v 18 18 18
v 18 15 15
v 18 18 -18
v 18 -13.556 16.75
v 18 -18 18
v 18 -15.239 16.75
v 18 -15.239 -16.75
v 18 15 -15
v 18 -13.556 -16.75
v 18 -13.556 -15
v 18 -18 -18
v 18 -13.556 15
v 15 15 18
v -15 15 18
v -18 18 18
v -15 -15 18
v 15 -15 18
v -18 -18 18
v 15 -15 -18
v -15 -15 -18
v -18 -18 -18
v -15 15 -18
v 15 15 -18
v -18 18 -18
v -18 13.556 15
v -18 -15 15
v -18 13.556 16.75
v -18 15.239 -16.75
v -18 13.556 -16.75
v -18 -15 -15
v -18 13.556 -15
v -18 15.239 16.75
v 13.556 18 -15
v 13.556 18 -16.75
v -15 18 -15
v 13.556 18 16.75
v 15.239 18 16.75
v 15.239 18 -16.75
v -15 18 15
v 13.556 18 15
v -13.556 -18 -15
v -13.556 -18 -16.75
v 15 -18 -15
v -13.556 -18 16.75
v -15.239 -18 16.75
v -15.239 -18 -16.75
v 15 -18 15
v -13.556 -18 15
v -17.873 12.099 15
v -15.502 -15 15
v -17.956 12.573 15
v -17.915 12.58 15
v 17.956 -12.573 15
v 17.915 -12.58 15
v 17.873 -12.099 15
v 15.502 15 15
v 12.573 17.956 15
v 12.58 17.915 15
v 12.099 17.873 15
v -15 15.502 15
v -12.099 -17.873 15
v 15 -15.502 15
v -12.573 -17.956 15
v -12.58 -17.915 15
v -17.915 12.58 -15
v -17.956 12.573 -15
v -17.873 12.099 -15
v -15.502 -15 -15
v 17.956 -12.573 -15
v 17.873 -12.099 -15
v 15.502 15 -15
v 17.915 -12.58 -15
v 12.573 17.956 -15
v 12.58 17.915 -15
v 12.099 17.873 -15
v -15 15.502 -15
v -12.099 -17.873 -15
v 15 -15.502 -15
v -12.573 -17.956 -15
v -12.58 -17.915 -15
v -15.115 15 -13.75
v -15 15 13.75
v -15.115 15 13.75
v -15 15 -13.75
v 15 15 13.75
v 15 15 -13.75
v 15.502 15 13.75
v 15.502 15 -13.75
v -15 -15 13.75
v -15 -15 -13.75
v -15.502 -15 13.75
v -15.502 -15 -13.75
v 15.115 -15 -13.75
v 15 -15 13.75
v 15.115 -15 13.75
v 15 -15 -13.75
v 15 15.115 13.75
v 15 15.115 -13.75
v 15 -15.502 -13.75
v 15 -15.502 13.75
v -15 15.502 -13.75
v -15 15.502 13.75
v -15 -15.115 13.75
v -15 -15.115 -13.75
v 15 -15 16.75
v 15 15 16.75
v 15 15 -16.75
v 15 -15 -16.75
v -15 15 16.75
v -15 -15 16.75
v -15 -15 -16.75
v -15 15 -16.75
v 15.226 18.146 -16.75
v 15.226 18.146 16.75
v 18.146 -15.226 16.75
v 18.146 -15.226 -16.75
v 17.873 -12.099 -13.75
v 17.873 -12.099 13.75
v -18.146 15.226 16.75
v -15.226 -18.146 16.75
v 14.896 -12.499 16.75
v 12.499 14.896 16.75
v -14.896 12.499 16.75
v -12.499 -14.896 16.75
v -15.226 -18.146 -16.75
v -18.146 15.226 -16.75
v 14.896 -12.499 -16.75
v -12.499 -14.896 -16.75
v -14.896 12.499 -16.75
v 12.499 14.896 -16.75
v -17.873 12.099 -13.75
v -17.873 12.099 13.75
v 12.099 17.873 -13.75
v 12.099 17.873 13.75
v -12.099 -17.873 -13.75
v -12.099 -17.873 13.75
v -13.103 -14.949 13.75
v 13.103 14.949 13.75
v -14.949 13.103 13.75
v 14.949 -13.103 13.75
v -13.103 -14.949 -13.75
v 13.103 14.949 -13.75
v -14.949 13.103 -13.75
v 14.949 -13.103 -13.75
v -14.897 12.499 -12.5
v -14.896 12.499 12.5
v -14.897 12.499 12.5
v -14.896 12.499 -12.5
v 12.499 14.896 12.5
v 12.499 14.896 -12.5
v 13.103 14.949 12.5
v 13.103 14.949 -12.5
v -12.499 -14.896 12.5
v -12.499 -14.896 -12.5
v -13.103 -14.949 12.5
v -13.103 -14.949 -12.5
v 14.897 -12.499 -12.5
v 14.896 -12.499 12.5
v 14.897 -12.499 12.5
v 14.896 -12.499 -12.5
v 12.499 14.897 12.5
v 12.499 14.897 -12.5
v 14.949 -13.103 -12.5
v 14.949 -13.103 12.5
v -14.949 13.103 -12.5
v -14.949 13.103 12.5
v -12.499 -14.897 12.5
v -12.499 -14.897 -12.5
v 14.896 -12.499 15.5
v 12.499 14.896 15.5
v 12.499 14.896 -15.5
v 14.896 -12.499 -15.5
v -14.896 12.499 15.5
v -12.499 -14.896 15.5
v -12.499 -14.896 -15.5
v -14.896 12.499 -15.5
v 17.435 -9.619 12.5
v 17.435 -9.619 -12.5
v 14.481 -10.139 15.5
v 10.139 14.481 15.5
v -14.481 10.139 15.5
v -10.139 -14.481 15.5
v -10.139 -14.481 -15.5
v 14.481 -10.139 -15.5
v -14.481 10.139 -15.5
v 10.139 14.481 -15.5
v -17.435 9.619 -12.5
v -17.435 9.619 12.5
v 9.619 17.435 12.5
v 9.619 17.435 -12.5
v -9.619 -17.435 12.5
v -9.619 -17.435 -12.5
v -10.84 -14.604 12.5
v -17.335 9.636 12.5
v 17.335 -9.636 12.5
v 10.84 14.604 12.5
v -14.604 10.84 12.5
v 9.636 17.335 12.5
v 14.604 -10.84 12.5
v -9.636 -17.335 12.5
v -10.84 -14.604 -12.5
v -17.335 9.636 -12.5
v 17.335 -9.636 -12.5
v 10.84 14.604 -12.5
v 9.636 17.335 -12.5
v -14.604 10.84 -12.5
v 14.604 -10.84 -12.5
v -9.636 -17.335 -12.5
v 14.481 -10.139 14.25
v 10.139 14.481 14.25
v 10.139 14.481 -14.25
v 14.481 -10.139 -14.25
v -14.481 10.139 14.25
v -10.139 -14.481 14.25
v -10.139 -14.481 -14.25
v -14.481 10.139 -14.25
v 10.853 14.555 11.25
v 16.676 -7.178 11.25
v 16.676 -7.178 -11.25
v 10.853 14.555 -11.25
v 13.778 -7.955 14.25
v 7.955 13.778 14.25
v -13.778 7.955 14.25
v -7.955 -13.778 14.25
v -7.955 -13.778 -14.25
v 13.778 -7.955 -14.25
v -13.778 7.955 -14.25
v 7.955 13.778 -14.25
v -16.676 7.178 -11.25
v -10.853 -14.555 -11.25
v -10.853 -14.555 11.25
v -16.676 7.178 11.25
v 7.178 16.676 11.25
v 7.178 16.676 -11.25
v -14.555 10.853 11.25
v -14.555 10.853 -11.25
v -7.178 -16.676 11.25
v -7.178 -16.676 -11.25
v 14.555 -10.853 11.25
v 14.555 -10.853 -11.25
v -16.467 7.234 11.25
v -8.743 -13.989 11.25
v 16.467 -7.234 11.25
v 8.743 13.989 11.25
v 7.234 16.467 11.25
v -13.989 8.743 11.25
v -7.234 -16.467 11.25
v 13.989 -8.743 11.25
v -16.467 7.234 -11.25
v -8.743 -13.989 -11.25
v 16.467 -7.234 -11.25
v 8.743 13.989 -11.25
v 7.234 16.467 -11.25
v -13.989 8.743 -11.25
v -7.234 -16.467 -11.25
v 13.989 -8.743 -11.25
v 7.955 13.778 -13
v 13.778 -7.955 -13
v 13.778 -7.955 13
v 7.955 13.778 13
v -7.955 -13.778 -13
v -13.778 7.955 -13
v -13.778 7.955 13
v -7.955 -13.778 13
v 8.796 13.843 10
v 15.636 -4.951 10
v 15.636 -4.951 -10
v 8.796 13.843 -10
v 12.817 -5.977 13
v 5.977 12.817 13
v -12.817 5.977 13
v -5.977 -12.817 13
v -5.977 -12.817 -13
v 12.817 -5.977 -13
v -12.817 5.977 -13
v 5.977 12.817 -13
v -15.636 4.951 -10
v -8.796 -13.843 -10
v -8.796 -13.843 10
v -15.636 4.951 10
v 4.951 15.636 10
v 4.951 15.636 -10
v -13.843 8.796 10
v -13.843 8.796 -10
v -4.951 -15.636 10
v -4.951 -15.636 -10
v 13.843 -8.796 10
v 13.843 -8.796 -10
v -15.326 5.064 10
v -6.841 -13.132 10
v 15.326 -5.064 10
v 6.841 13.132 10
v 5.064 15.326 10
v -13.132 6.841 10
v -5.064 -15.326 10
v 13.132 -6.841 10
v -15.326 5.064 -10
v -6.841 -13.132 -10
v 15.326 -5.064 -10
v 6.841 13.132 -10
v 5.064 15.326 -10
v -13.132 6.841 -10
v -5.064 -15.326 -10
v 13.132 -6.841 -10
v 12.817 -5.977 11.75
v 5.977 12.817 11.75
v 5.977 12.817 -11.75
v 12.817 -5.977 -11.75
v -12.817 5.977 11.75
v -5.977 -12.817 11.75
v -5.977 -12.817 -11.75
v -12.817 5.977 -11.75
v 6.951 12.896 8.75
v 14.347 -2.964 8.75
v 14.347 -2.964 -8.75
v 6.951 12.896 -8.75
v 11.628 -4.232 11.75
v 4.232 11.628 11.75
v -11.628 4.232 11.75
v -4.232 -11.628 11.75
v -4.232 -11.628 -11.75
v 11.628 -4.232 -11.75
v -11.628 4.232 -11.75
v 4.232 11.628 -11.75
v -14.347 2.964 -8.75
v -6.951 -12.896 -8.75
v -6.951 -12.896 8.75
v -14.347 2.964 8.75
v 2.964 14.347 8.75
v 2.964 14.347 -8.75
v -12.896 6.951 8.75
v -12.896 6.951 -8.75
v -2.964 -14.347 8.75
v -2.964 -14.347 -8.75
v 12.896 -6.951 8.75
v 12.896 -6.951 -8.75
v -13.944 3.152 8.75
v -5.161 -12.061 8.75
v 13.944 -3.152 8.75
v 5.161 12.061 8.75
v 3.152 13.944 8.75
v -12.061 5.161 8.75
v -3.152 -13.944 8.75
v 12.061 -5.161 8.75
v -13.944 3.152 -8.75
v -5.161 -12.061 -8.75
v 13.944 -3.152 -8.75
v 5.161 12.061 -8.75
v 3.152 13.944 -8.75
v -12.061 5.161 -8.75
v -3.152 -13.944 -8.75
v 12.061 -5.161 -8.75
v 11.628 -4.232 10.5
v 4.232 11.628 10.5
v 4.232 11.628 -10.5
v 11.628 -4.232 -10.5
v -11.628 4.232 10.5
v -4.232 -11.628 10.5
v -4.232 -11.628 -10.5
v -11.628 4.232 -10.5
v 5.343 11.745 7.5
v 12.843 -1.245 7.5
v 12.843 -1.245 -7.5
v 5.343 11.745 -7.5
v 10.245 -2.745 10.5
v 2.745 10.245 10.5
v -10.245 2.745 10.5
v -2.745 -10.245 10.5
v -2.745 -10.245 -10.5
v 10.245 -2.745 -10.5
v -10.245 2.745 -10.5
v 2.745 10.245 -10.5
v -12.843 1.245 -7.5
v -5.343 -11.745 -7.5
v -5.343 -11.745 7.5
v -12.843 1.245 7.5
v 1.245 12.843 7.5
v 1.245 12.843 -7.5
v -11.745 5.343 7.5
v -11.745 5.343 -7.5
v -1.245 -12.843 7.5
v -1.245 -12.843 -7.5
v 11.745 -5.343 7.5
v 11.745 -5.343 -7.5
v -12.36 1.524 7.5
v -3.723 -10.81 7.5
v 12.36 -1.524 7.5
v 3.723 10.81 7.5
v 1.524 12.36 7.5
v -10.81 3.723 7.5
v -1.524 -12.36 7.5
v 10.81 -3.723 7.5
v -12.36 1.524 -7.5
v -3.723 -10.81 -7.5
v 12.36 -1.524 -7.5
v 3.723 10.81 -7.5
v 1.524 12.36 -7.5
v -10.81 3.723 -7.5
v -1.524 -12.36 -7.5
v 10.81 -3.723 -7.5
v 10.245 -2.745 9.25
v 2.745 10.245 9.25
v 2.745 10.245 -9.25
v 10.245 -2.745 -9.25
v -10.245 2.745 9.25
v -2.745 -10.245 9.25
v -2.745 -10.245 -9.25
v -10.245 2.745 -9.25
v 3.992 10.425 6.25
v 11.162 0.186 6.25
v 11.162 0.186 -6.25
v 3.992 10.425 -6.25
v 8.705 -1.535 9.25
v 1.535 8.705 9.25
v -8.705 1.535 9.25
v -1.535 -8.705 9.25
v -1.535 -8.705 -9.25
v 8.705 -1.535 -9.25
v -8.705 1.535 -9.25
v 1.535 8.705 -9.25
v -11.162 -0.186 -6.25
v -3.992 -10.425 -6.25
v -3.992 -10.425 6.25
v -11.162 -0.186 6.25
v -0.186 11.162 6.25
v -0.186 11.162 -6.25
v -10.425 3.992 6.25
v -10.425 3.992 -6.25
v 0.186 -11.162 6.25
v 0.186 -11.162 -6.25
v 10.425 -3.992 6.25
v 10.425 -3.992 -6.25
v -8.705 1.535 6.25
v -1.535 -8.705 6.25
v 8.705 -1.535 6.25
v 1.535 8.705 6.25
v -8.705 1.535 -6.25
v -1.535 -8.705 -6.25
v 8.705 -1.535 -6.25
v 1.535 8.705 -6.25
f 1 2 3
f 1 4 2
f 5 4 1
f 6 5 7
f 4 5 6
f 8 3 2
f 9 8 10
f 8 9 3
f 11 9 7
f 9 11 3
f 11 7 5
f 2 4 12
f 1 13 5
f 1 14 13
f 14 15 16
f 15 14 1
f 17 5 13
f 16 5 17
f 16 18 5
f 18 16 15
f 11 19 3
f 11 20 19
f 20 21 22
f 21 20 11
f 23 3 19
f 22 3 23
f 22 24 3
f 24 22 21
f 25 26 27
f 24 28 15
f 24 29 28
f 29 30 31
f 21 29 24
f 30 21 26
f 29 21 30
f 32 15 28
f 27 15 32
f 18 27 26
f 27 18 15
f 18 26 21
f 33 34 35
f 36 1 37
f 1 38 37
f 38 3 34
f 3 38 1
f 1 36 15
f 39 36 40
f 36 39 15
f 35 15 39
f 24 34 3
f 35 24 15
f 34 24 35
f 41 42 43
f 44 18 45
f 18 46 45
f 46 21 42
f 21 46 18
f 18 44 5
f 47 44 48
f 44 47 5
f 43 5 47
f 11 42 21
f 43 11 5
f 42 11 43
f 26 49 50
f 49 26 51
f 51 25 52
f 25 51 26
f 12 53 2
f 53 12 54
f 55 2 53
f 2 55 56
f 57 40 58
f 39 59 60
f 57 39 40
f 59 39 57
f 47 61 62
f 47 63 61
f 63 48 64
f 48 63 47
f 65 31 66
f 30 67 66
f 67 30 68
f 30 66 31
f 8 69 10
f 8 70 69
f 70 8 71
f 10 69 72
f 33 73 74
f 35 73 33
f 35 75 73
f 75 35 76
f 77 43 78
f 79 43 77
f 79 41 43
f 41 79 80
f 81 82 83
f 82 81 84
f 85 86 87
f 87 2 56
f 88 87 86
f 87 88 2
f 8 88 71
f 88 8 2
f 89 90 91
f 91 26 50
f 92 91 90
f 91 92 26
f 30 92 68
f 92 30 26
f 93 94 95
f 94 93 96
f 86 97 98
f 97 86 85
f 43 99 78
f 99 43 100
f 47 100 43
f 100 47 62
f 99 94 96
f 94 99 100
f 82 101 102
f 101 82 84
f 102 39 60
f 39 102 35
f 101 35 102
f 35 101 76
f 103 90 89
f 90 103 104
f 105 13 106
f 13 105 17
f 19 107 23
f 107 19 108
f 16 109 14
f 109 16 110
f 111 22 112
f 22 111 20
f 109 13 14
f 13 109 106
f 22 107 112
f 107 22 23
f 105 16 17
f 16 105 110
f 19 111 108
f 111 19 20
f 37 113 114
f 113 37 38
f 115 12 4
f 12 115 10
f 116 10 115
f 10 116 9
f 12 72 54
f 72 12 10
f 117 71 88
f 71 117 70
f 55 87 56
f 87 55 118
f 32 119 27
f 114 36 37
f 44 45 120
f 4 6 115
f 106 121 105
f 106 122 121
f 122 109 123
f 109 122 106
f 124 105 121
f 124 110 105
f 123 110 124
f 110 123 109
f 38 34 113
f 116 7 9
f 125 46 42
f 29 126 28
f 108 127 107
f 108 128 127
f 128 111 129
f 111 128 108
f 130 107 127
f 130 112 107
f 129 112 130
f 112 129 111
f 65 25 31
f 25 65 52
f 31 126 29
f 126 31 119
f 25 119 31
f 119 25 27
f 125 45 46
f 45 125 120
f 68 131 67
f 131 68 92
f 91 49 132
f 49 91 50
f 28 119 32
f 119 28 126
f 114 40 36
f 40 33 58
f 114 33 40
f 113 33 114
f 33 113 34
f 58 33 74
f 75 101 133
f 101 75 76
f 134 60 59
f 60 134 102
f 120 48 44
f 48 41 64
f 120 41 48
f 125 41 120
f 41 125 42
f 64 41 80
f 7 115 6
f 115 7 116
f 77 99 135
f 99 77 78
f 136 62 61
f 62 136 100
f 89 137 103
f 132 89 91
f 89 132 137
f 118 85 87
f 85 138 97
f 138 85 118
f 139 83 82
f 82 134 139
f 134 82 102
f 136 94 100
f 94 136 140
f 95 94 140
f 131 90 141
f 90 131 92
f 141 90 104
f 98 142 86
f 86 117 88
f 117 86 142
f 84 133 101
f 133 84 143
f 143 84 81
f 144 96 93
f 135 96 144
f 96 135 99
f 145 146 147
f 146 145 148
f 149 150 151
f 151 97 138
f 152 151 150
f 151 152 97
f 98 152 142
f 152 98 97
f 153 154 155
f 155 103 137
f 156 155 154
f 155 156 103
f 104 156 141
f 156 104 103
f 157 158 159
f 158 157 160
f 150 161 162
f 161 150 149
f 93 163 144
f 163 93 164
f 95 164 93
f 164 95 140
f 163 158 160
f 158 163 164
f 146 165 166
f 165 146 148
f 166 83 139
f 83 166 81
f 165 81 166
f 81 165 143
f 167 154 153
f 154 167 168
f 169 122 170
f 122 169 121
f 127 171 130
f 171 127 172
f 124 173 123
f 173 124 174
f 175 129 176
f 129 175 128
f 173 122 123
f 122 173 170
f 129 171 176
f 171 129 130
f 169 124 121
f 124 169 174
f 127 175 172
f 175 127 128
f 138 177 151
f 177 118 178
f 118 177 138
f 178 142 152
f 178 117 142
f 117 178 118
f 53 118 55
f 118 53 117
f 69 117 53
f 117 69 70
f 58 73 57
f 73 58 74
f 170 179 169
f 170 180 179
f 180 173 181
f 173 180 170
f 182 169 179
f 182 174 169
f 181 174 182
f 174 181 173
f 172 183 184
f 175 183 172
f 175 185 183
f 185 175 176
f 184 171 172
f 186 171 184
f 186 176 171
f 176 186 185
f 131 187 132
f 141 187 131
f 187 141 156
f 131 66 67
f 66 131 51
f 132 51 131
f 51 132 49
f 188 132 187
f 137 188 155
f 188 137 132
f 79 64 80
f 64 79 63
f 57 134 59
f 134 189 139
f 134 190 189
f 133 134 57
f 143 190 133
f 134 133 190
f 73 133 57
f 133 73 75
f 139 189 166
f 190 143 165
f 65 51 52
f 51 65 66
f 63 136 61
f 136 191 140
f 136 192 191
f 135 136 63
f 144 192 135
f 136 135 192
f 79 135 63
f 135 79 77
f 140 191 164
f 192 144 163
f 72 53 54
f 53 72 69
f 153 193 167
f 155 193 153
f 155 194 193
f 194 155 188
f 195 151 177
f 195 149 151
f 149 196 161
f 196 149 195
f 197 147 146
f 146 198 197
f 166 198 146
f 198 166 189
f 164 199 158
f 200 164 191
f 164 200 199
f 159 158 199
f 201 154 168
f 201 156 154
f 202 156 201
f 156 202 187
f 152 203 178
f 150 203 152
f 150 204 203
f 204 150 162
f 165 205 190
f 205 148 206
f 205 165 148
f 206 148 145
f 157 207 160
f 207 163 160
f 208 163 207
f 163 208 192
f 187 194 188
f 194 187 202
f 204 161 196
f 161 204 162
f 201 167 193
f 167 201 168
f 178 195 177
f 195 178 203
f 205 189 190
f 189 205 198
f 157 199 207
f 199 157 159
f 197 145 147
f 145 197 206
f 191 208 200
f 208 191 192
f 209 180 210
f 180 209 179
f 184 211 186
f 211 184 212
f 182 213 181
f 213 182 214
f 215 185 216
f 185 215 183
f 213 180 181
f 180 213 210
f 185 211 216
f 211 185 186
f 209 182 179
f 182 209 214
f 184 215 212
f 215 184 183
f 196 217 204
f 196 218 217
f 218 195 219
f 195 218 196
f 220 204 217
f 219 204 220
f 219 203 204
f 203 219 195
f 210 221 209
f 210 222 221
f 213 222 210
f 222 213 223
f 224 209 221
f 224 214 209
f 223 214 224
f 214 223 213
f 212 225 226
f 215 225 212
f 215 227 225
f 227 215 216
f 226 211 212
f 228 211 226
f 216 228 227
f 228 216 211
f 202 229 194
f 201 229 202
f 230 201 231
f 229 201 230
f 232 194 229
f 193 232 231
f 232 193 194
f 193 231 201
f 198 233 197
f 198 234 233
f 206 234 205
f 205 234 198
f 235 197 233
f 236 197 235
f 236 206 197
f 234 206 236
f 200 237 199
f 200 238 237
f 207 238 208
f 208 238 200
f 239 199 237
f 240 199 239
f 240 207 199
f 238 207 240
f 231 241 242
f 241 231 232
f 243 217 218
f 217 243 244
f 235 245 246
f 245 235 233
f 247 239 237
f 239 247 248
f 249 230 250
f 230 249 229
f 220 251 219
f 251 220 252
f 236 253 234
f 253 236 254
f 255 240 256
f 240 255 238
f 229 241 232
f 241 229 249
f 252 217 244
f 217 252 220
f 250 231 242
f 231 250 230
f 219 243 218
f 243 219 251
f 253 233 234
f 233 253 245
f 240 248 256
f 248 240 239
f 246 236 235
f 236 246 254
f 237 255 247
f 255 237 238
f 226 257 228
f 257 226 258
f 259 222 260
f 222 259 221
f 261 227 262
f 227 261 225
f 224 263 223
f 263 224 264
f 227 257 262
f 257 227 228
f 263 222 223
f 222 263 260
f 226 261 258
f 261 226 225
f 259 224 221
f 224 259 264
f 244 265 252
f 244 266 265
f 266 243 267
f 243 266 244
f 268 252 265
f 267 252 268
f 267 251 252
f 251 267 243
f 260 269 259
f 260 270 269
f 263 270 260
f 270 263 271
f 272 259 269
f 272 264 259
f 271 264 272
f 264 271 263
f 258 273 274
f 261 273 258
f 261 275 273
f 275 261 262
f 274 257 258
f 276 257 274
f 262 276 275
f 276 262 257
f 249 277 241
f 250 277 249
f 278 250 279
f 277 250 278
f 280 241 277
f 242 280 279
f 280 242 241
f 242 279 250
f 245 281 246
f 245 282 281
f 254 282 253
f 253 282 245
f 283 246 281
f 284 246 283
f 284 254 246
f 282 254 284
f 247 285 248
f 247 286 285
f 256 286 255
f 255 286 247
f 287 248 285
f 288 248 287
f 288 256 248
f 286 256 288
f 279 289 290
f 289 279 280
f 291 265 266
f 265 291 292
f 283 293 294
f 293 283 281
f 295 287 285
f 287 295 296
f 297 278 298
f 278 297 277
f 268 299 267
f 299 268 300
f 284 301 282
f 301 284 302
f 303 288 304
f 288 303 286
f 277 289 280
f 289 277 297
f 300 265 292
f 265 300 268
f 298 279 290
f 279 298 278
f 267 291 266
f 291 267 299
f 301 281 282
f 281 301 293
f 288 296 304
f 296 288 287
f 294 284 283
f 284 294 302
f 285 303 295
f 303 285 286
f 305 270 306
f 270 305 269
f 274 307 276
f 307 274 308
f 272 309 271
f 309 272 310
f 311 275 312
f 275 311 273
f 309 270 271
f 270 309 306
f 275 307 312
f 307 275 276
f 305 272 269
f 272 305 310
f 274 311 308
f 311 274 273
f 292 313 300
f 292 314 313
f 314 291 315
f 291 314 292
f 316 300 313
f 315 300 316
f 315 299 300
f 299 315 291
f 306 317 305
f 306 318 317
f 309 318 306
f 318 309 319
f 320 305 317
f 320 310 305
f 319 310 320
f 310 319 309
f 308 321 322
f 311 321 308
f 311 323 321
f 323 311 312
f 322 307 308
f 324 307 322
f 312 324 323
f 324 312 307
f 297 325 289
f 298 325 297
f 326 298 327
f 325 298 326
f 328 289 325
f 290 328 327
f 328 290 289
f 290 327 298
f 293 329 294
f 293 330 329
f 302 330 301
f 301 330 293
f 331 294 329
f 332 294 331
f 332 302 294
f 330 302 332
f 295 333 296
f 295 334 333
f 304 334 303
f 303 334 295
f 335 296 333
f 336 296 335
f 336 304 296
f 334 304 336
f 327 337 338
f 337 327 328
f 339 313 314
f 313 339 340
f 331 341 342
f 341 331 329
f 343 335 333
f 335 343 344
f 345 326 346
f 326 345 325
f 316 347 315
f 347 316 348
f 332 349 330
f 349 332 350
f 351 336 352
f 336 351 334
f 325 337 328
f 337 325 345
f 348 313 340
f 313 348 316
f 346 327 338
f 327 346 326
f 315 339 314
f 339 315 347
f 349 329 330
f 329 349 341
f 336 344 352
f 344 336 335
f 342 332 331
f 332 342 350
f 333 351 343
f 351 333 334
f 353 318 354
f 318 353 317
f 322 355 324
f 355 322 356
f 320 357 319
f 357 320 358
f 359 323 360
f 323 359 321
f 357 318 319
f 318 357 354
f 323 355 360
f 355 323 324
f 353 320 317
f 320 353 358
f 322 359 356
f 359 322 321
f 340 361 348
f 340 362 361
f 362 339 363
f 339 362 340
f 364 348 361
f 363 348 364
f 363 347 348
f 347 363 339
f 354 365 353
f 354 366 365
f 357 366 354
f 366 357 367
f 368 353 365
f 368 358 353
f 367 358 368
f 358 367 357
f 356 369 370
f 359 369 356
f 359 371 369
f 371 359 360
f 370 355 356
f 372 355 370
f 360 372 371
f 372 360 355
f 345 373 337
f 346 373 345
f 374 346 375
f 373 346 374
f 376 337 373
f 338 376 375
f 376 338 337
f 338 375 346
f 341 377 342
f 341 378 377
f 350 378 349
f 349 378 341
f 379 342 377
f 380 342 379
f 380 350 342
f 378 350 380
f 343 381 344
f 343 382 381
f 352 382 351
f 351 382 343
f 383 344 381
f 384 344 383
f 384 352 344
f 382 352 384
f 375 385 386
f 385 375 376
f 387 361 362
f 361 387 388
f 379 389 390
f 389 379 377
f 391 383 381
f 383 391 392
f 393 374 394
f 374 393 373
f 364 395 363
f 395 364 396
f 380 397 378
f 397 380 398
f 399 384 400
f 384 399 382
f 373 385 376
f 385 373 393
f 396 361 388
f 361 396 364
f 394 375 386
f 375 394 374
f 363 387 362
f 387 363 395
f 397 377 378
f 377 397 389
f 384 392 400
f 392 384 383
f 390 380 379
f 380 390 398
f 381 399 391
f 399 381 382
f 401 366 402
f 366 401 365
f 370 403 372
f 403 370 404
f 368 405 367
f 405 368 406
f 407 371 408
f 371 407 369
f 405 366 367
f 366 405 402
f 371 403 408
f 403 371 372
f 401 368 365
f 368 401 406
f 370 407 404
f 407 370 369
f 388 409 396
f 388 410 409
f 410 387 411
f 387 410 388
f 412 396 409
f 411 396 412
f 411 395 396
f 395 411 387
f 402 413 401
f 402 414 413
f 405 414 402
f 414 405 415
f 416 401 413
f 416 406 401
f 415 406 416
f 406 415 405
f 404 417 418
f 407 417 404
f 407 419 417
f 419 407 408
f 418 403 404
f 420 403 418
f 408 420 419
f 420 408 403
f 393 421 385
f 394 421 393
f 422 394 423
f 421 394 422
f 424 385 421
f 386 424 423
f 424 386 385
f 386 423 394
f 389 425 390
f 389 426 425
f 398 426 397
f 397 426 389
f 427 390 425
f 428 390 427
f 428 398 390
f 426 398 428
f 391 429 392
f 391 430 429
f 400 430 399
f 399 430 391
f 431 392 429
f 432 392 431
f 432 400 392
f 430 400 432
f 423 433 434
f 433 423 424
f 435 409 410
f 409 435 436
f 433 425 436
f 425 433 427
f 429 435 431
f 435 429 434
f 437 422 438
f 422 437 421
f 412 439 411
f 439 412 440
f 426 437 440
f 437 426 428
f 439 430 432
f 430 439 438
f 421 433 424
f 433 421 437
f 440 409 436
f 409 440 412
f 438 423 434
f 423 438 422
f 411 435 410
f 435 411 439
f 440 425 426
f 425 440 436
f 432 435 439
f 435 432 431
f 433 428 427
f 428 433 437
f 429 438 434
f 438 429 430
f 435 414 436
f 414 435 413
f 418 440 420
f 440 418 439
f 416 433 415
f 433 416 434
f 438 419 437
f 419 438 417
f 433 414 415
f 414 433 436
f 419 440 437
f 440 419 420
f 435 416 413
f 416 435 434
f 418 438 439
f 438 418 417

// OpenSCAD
wall_thickness = 3;
INIT_SIZE=35;

module cube_edges(size, rotation) {
  d1 = size - wall_thickness*2;
  d2 = size + wall_thickness;

  rotate([0,0,rotation])
  difference() {
    cube([size, size, size], true);
    cube([d2, d1, d1], true);
    cube([d1, d2, d1], true);
    cube([d1, d1, d2], true);
  }
}


union()
for (i = [0: 5: INIT_SIZE]) {
  cube_edges(INIT_SIZE - i/2+1, i);
}
